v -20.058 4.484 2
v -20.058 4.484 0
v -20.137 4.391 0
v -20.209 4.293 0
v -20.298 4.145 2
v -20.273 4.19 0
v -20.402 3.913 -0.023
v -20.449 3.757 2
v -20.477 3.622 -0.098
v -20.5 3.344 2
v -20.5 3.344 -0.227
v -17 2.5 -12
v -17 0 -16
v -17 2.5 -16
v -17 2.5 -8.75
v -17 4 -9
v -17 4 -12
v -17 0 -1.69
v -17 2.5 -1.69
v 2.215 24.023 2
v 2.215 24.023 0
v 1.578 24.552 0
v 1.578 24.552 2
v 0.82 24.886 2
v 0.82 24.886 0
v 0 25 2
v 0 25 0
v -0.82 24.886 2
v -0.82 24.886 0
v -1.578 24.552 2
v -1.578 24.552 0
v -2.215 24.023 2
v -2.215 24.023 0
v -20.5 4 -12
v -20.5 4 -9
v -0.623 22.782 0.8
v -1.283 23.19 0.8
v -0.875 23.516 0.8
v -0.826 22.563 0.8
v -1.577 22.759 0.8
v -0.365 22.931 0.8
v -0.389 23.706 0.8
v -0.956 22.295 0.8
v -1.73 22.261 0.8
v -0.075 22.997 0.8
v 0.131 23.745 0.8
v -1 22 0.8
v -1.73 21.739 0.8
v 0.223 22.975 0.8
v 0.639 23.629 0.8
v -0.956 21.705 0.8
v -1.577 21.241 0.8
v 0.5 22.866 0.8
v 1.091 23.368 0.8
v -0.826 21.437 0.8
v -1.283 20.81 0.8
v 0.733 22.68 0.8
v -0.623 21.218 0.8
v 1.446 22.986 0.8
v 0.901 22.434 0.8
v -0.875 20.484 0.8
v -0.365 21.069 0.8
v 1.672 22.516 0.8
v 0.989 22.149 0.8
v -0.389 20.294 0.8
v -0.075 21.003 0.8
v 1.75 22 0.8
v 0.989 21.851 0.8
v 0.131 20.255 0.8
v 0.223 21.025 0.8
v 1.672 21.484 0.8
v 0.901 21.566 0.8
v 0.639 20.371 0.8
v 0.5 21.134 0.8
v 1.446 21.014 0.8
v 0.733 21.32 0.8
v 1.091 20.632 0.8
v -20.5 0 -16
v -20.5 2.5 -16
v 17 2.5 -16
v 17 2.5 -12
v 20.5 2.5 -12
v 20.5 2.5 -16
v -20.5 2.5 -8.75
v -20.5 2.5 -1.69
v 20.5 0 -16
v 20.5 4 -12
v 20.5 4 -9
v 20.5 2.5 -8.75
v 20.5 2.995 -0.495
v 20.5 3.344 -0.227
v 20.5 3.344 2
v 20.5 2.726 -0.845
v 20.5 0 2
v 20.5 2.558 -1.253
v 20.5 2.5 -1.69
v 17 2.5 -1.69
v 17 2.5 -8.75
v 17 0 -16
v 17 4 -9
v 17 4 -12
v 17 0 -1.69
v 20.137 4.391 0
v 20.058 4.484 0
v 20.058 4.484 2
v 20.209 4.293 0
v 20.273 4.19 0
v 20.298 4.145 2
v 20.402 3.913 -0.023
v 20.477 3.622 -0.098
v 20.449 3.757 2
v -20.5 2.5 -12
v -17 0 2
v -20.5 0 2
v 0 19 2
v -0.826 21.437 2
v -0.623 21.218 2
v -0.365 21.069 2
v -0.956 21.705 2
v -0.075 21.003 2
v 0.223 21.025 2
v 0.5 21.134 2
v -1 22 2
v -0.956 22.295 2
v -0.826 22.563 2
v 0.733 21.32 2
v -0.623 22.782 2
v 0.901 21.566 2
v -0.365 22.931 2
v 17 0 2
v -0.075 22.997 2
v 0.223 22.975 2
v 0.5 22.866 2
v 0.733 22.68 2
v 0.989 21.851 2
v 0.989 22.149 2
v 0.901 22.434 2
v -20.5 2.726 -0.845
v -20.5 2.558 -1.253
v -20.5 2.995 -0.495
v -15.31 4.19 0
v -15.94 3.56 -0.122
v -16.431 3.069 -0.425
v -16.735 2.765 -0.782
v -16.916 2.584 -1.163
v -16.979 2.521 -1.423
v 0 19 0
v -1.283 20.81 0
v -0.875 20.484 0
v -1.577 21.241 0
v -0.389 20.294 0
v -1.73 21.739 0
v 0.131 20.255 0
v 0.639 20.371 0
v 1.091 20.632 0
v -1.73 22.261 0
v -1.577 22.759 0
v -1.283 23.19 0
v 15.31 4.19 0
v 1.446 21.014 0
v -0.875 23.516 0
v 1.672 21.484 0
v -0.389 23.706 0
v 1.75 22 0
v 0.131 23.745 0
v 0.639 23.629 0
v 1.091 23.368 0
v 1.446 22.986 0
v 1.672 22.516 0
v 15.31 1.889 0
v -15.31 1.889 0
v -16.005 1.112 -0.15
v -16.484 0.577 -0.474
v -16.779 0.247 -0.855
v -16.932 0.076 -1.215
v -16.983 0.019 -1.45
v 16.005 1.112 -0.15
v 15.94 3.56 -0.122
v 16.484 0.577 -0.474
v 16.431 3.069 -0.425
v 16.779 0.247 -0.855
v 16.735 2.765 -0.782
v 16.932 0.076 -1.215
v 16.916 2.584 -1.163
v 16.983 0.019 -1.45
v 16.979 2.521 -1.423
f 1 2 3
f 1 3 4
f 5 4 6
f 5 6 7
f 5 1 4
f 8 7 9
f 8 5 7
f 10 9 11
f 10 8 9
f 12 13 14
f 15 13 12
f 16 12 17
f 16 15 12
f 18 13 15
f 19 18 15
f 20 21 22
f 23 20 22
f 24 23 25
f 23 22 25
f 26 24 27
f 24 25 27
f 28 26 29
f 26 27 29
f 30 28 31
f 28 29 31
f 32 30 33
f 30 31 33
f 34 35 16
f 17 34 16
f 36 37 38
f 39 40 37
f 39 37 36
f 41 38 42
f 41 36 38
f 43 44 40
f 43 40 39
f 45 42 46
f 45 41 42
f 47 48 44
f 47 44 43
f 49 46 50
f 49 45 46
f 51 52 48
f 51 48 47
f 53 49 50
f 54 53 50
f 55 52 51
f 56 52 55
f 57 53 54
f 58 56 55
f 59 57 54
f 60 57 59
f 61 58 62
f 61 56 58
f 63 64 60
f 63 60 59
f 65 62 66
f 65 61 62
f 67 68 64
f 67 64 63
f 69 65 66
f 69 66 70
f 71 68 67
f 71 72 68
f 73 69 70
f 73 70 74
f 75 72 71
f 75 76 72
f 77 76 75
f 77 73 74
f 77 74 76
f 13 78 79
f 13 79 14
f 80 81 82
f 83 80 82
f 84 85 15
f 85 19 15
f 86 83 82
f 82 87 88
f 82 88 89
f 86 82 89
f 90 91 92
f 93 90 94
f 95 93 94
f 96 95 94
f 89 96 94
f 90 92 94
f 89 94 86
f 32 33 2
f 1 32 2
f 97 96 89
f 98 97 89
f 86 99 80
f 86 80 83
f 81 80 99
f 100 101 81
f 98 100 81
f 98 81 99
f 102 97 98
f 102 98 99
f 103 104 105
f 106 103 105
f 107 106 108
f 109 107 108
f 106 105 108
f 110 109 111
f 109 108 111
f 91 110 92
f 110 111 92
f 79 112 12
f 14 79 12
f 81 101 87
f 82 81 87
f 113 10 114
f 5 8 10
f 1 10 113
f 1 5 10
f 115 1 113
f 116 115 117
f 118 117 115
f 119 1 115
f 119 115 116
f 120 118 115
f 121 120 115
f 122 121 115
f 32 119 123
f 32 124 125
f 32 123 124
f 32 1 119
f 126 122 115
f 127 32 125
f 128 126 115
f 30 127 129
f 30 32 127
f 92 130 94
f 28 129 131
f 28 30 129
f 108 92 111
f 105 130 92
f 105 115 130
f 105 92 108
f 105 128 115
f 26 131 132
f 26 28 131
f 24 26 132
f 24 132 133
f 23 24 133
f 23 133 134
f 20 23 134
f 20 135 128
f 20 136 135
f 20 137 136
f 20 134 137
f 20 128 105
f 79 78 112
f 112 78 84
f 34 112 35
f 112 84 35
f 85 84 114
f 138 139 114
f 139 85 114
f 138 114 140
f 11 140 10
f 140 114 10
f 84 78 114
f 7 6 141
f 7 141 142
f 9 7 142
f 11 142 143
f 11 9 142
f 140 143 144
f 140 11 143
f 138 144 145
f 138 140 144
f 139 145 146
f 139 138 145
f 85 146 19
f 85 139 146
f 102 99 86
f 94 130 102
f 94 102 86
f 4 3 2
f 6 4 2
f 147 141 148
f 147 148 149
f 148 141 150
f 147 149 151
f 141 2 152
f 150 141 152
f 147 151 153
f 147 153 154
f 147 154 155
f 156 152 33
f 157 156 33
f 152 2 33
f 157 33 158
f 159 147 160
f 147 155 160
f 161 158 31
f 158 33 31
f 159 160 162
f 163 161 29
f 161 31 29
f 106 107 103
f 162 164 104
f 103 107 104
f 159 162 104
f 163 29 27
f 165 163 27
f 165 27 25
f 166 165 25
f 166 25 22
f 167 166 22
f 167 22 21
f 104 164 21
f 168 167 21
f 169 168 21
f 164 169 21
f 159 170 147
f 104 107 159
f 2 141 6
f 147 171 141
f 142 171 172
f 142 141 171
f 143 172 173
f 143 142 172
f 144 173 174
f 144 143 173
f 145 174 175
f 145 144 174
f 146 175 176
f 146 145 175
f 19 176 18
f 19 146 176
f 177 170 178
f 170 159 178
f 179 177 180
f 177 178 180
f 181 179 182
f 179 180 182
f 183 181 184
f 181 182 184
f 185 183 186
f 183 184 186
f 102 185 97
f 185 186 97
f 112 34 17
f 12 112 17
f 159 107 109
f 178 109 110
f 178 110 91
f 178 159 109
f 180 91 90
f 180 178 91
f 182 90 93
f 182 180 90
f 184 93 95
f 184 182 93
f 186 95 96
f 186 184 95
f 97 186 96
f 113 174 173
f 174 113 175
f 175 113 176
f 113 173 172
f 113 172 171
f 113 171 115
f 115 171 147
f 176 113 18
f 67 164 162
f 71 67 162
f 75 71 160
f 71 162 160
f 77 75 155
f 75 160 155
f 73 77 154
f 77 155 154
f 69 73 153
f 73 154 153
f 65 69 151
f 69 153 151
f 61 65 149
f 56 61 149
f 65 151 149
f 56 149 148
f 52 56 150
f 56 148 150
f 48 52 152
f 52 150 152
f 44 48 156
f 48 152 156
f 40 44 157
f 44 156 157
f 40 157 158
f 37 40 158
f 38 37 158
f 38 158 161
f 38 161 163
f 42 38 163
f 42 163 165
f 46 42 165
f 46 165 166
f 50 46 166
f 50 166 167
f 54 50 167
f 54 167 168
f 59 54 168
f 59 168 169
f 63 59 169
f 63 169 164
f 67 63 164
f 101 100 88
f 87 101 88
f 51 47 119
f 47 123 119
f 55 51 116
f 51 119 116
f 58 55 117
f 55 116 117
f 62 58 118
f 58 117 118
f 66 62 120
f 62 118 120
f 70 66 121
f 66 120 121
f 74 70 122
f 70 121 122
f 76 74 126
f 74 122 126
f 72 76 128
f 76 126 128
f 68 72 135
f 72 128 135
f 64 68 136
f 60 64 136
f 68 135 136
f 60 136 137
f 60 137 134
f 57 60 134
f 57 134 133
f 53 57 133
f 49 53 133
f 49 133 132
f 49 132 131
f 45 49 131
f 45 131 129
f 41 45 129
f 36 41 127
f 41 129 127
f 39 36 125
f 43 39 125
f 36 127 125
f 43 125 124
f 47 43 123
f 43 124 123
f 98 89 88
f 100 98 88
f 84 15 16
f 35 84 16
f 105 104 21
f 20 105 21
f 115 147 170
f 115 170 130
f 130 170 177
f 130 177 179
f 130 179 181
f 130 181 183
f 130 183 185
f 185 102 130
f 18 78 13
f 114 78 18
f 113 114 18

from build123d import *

# Parameters (mm, degrees)
F0_W           = 3.5
F0_H           = 4
F1_DEPTH       = 2
F2_D           = 2
F2_CBORE_D     = 3.5
F2_CBORE_DEPTH = 0.8
F3_DEPTH       = 12
F5_DEPTH       = 41.001
F6_R           = 1.6899494937
F7_W           = 3.5
F7_H           = 2.5
F8_DEPTH       = 4


with BuildPart() as f1:
    # F0 (on Top) → F1 (new body)
    with BuildSketch(Plane.XY):
        with BuildLine():
            Line((-17, 0), (0, 19))
            ThreePointArc((0, 19), (-2.7448989049, 20.7894092344), (-2.2152995112, 24.0229799988))
            Line((-2.2152995112, 24.0229799988), (-20.5, 4))
            Line((-20.5, 4), (-17, 4))
            Line((-17, 4), (-17, 0))
        make_face()
        with BuildLine():
            ThreePointArc((0, 19), (2.1213203436, 19.8786796564), (3, 22))
            ThreePointArc((3, 22), (2.7969535689, 23.0849196898), (2.2152995112, 24.0229799988))
            ThreePointArc((2.2152995112, 24.0229799988), (0, 25), (-2.2152995112, 24.0229799988))
            ThreePointArc((-2.2152995112, 24.0229799988), (-2.7448989049, 20.7894092344), (0, 19))
        make_face()
        with BuildLine():
            ThreePointArc((2.2152995112, 24.0229799988), (2.7969535689, 23.0849196898), (3, 22))
            ThreePointArc((3, 22), (2.1213203436, 19.8786796564), (0, 19))
            Line((0, 19), (17, 0))
            Line((17, 0), (17, 4))
            Line((17, 4), (20.5, 4))
            Line((20.5, 4), (2.2152995112, 24.0229799988))
        make_face()
        with Locations((-18.75, 2)):
            Rectangle(F0_W, F0_H)
        with Locations((18.75, 2)):
            Rectangle(F0_W, F0_H)
    extrude(amount=F1_DEPTH)

    # F2 (through all)
    with Locations(Plane(origin=(0, 0, 0), x_dir=(1, 0, 0), z_dir=(0, 0, -1))):
        with Locations((0, -22)):
            CounterBoreHole(F2_D / 2, F2_CBORE_D / 2, F2_CBORE_DEPTH)

    # F0 (on Top) → F3 (join)
    with BuildSketch(Plane.XY):
        with Locations((18.75, 2)):
            Rectangle(F0_W, F0_H)
        with Locations((-18.75, 2)):
            Rectangle(F0_W, F0_H)
    extrude(amount=-F3_DEPTH)

    # F4 (on face) → F5 (cut, through all)
    with BuildSketch(Plane.YZ.offset(20.5)):
        Polygon((4, -9), (4, 0), (2.5, 0), (2.5, -8.75), align=None)
    extrude(amount=-F5_DEPTH, mode=Mode.SUBTRACT)

    # F6 (call 1 of 4: OpenCascade refuses the feature's edges together)
    f6_edges = [f1.edges().sort_by_distance(p)[0] for p in [
        (20.5, 4, 1),
    ]]
    fillet(f6_edges, radius=F6_R)

    # F6#2 (call 2 of 4)
    f6_2_edges = [f1.edges().sort_by_distance(p)[0] for p in [
        (-20.5, 4, 1),
    ]]
    fillet(f6_2_edges, radius=F6_R)

    # F6#3 (call 3 of 4)
    f6_3_edges = [f1.edges().sort_by_distance(p)[0] for p in [
        (-17, 1.25, 0),
        (-18.75, 2.5, 0),
    ]]
    fillet(f6_3_edges, radius=F6_R)

    # F6#4 (call 4 of 4)
    f6_4_edges = [f1.edges().sort_by_distance(p)[0] for p in [
        (18.75, 2.5, 0),
        (17, 1.25, 0),
    ]]
    fillet(f6_4_edges, radius=F6_R)

    # F7 (on face) → F8 (join)
    with BuildSketch(Plane(origin=(0, 0, -12), x_dir=(1, 0, 0), z_dir=(0, 0, -1))):
        with Locations((18.75, -1.25)):
            Rectangle(F7_W, F7_H)
        with Locations((-18.75, -1.25)):
            Rectangle(F7_W, F7_H)
    extrude(amount=F8_DEPTH)


solid = f1.part
